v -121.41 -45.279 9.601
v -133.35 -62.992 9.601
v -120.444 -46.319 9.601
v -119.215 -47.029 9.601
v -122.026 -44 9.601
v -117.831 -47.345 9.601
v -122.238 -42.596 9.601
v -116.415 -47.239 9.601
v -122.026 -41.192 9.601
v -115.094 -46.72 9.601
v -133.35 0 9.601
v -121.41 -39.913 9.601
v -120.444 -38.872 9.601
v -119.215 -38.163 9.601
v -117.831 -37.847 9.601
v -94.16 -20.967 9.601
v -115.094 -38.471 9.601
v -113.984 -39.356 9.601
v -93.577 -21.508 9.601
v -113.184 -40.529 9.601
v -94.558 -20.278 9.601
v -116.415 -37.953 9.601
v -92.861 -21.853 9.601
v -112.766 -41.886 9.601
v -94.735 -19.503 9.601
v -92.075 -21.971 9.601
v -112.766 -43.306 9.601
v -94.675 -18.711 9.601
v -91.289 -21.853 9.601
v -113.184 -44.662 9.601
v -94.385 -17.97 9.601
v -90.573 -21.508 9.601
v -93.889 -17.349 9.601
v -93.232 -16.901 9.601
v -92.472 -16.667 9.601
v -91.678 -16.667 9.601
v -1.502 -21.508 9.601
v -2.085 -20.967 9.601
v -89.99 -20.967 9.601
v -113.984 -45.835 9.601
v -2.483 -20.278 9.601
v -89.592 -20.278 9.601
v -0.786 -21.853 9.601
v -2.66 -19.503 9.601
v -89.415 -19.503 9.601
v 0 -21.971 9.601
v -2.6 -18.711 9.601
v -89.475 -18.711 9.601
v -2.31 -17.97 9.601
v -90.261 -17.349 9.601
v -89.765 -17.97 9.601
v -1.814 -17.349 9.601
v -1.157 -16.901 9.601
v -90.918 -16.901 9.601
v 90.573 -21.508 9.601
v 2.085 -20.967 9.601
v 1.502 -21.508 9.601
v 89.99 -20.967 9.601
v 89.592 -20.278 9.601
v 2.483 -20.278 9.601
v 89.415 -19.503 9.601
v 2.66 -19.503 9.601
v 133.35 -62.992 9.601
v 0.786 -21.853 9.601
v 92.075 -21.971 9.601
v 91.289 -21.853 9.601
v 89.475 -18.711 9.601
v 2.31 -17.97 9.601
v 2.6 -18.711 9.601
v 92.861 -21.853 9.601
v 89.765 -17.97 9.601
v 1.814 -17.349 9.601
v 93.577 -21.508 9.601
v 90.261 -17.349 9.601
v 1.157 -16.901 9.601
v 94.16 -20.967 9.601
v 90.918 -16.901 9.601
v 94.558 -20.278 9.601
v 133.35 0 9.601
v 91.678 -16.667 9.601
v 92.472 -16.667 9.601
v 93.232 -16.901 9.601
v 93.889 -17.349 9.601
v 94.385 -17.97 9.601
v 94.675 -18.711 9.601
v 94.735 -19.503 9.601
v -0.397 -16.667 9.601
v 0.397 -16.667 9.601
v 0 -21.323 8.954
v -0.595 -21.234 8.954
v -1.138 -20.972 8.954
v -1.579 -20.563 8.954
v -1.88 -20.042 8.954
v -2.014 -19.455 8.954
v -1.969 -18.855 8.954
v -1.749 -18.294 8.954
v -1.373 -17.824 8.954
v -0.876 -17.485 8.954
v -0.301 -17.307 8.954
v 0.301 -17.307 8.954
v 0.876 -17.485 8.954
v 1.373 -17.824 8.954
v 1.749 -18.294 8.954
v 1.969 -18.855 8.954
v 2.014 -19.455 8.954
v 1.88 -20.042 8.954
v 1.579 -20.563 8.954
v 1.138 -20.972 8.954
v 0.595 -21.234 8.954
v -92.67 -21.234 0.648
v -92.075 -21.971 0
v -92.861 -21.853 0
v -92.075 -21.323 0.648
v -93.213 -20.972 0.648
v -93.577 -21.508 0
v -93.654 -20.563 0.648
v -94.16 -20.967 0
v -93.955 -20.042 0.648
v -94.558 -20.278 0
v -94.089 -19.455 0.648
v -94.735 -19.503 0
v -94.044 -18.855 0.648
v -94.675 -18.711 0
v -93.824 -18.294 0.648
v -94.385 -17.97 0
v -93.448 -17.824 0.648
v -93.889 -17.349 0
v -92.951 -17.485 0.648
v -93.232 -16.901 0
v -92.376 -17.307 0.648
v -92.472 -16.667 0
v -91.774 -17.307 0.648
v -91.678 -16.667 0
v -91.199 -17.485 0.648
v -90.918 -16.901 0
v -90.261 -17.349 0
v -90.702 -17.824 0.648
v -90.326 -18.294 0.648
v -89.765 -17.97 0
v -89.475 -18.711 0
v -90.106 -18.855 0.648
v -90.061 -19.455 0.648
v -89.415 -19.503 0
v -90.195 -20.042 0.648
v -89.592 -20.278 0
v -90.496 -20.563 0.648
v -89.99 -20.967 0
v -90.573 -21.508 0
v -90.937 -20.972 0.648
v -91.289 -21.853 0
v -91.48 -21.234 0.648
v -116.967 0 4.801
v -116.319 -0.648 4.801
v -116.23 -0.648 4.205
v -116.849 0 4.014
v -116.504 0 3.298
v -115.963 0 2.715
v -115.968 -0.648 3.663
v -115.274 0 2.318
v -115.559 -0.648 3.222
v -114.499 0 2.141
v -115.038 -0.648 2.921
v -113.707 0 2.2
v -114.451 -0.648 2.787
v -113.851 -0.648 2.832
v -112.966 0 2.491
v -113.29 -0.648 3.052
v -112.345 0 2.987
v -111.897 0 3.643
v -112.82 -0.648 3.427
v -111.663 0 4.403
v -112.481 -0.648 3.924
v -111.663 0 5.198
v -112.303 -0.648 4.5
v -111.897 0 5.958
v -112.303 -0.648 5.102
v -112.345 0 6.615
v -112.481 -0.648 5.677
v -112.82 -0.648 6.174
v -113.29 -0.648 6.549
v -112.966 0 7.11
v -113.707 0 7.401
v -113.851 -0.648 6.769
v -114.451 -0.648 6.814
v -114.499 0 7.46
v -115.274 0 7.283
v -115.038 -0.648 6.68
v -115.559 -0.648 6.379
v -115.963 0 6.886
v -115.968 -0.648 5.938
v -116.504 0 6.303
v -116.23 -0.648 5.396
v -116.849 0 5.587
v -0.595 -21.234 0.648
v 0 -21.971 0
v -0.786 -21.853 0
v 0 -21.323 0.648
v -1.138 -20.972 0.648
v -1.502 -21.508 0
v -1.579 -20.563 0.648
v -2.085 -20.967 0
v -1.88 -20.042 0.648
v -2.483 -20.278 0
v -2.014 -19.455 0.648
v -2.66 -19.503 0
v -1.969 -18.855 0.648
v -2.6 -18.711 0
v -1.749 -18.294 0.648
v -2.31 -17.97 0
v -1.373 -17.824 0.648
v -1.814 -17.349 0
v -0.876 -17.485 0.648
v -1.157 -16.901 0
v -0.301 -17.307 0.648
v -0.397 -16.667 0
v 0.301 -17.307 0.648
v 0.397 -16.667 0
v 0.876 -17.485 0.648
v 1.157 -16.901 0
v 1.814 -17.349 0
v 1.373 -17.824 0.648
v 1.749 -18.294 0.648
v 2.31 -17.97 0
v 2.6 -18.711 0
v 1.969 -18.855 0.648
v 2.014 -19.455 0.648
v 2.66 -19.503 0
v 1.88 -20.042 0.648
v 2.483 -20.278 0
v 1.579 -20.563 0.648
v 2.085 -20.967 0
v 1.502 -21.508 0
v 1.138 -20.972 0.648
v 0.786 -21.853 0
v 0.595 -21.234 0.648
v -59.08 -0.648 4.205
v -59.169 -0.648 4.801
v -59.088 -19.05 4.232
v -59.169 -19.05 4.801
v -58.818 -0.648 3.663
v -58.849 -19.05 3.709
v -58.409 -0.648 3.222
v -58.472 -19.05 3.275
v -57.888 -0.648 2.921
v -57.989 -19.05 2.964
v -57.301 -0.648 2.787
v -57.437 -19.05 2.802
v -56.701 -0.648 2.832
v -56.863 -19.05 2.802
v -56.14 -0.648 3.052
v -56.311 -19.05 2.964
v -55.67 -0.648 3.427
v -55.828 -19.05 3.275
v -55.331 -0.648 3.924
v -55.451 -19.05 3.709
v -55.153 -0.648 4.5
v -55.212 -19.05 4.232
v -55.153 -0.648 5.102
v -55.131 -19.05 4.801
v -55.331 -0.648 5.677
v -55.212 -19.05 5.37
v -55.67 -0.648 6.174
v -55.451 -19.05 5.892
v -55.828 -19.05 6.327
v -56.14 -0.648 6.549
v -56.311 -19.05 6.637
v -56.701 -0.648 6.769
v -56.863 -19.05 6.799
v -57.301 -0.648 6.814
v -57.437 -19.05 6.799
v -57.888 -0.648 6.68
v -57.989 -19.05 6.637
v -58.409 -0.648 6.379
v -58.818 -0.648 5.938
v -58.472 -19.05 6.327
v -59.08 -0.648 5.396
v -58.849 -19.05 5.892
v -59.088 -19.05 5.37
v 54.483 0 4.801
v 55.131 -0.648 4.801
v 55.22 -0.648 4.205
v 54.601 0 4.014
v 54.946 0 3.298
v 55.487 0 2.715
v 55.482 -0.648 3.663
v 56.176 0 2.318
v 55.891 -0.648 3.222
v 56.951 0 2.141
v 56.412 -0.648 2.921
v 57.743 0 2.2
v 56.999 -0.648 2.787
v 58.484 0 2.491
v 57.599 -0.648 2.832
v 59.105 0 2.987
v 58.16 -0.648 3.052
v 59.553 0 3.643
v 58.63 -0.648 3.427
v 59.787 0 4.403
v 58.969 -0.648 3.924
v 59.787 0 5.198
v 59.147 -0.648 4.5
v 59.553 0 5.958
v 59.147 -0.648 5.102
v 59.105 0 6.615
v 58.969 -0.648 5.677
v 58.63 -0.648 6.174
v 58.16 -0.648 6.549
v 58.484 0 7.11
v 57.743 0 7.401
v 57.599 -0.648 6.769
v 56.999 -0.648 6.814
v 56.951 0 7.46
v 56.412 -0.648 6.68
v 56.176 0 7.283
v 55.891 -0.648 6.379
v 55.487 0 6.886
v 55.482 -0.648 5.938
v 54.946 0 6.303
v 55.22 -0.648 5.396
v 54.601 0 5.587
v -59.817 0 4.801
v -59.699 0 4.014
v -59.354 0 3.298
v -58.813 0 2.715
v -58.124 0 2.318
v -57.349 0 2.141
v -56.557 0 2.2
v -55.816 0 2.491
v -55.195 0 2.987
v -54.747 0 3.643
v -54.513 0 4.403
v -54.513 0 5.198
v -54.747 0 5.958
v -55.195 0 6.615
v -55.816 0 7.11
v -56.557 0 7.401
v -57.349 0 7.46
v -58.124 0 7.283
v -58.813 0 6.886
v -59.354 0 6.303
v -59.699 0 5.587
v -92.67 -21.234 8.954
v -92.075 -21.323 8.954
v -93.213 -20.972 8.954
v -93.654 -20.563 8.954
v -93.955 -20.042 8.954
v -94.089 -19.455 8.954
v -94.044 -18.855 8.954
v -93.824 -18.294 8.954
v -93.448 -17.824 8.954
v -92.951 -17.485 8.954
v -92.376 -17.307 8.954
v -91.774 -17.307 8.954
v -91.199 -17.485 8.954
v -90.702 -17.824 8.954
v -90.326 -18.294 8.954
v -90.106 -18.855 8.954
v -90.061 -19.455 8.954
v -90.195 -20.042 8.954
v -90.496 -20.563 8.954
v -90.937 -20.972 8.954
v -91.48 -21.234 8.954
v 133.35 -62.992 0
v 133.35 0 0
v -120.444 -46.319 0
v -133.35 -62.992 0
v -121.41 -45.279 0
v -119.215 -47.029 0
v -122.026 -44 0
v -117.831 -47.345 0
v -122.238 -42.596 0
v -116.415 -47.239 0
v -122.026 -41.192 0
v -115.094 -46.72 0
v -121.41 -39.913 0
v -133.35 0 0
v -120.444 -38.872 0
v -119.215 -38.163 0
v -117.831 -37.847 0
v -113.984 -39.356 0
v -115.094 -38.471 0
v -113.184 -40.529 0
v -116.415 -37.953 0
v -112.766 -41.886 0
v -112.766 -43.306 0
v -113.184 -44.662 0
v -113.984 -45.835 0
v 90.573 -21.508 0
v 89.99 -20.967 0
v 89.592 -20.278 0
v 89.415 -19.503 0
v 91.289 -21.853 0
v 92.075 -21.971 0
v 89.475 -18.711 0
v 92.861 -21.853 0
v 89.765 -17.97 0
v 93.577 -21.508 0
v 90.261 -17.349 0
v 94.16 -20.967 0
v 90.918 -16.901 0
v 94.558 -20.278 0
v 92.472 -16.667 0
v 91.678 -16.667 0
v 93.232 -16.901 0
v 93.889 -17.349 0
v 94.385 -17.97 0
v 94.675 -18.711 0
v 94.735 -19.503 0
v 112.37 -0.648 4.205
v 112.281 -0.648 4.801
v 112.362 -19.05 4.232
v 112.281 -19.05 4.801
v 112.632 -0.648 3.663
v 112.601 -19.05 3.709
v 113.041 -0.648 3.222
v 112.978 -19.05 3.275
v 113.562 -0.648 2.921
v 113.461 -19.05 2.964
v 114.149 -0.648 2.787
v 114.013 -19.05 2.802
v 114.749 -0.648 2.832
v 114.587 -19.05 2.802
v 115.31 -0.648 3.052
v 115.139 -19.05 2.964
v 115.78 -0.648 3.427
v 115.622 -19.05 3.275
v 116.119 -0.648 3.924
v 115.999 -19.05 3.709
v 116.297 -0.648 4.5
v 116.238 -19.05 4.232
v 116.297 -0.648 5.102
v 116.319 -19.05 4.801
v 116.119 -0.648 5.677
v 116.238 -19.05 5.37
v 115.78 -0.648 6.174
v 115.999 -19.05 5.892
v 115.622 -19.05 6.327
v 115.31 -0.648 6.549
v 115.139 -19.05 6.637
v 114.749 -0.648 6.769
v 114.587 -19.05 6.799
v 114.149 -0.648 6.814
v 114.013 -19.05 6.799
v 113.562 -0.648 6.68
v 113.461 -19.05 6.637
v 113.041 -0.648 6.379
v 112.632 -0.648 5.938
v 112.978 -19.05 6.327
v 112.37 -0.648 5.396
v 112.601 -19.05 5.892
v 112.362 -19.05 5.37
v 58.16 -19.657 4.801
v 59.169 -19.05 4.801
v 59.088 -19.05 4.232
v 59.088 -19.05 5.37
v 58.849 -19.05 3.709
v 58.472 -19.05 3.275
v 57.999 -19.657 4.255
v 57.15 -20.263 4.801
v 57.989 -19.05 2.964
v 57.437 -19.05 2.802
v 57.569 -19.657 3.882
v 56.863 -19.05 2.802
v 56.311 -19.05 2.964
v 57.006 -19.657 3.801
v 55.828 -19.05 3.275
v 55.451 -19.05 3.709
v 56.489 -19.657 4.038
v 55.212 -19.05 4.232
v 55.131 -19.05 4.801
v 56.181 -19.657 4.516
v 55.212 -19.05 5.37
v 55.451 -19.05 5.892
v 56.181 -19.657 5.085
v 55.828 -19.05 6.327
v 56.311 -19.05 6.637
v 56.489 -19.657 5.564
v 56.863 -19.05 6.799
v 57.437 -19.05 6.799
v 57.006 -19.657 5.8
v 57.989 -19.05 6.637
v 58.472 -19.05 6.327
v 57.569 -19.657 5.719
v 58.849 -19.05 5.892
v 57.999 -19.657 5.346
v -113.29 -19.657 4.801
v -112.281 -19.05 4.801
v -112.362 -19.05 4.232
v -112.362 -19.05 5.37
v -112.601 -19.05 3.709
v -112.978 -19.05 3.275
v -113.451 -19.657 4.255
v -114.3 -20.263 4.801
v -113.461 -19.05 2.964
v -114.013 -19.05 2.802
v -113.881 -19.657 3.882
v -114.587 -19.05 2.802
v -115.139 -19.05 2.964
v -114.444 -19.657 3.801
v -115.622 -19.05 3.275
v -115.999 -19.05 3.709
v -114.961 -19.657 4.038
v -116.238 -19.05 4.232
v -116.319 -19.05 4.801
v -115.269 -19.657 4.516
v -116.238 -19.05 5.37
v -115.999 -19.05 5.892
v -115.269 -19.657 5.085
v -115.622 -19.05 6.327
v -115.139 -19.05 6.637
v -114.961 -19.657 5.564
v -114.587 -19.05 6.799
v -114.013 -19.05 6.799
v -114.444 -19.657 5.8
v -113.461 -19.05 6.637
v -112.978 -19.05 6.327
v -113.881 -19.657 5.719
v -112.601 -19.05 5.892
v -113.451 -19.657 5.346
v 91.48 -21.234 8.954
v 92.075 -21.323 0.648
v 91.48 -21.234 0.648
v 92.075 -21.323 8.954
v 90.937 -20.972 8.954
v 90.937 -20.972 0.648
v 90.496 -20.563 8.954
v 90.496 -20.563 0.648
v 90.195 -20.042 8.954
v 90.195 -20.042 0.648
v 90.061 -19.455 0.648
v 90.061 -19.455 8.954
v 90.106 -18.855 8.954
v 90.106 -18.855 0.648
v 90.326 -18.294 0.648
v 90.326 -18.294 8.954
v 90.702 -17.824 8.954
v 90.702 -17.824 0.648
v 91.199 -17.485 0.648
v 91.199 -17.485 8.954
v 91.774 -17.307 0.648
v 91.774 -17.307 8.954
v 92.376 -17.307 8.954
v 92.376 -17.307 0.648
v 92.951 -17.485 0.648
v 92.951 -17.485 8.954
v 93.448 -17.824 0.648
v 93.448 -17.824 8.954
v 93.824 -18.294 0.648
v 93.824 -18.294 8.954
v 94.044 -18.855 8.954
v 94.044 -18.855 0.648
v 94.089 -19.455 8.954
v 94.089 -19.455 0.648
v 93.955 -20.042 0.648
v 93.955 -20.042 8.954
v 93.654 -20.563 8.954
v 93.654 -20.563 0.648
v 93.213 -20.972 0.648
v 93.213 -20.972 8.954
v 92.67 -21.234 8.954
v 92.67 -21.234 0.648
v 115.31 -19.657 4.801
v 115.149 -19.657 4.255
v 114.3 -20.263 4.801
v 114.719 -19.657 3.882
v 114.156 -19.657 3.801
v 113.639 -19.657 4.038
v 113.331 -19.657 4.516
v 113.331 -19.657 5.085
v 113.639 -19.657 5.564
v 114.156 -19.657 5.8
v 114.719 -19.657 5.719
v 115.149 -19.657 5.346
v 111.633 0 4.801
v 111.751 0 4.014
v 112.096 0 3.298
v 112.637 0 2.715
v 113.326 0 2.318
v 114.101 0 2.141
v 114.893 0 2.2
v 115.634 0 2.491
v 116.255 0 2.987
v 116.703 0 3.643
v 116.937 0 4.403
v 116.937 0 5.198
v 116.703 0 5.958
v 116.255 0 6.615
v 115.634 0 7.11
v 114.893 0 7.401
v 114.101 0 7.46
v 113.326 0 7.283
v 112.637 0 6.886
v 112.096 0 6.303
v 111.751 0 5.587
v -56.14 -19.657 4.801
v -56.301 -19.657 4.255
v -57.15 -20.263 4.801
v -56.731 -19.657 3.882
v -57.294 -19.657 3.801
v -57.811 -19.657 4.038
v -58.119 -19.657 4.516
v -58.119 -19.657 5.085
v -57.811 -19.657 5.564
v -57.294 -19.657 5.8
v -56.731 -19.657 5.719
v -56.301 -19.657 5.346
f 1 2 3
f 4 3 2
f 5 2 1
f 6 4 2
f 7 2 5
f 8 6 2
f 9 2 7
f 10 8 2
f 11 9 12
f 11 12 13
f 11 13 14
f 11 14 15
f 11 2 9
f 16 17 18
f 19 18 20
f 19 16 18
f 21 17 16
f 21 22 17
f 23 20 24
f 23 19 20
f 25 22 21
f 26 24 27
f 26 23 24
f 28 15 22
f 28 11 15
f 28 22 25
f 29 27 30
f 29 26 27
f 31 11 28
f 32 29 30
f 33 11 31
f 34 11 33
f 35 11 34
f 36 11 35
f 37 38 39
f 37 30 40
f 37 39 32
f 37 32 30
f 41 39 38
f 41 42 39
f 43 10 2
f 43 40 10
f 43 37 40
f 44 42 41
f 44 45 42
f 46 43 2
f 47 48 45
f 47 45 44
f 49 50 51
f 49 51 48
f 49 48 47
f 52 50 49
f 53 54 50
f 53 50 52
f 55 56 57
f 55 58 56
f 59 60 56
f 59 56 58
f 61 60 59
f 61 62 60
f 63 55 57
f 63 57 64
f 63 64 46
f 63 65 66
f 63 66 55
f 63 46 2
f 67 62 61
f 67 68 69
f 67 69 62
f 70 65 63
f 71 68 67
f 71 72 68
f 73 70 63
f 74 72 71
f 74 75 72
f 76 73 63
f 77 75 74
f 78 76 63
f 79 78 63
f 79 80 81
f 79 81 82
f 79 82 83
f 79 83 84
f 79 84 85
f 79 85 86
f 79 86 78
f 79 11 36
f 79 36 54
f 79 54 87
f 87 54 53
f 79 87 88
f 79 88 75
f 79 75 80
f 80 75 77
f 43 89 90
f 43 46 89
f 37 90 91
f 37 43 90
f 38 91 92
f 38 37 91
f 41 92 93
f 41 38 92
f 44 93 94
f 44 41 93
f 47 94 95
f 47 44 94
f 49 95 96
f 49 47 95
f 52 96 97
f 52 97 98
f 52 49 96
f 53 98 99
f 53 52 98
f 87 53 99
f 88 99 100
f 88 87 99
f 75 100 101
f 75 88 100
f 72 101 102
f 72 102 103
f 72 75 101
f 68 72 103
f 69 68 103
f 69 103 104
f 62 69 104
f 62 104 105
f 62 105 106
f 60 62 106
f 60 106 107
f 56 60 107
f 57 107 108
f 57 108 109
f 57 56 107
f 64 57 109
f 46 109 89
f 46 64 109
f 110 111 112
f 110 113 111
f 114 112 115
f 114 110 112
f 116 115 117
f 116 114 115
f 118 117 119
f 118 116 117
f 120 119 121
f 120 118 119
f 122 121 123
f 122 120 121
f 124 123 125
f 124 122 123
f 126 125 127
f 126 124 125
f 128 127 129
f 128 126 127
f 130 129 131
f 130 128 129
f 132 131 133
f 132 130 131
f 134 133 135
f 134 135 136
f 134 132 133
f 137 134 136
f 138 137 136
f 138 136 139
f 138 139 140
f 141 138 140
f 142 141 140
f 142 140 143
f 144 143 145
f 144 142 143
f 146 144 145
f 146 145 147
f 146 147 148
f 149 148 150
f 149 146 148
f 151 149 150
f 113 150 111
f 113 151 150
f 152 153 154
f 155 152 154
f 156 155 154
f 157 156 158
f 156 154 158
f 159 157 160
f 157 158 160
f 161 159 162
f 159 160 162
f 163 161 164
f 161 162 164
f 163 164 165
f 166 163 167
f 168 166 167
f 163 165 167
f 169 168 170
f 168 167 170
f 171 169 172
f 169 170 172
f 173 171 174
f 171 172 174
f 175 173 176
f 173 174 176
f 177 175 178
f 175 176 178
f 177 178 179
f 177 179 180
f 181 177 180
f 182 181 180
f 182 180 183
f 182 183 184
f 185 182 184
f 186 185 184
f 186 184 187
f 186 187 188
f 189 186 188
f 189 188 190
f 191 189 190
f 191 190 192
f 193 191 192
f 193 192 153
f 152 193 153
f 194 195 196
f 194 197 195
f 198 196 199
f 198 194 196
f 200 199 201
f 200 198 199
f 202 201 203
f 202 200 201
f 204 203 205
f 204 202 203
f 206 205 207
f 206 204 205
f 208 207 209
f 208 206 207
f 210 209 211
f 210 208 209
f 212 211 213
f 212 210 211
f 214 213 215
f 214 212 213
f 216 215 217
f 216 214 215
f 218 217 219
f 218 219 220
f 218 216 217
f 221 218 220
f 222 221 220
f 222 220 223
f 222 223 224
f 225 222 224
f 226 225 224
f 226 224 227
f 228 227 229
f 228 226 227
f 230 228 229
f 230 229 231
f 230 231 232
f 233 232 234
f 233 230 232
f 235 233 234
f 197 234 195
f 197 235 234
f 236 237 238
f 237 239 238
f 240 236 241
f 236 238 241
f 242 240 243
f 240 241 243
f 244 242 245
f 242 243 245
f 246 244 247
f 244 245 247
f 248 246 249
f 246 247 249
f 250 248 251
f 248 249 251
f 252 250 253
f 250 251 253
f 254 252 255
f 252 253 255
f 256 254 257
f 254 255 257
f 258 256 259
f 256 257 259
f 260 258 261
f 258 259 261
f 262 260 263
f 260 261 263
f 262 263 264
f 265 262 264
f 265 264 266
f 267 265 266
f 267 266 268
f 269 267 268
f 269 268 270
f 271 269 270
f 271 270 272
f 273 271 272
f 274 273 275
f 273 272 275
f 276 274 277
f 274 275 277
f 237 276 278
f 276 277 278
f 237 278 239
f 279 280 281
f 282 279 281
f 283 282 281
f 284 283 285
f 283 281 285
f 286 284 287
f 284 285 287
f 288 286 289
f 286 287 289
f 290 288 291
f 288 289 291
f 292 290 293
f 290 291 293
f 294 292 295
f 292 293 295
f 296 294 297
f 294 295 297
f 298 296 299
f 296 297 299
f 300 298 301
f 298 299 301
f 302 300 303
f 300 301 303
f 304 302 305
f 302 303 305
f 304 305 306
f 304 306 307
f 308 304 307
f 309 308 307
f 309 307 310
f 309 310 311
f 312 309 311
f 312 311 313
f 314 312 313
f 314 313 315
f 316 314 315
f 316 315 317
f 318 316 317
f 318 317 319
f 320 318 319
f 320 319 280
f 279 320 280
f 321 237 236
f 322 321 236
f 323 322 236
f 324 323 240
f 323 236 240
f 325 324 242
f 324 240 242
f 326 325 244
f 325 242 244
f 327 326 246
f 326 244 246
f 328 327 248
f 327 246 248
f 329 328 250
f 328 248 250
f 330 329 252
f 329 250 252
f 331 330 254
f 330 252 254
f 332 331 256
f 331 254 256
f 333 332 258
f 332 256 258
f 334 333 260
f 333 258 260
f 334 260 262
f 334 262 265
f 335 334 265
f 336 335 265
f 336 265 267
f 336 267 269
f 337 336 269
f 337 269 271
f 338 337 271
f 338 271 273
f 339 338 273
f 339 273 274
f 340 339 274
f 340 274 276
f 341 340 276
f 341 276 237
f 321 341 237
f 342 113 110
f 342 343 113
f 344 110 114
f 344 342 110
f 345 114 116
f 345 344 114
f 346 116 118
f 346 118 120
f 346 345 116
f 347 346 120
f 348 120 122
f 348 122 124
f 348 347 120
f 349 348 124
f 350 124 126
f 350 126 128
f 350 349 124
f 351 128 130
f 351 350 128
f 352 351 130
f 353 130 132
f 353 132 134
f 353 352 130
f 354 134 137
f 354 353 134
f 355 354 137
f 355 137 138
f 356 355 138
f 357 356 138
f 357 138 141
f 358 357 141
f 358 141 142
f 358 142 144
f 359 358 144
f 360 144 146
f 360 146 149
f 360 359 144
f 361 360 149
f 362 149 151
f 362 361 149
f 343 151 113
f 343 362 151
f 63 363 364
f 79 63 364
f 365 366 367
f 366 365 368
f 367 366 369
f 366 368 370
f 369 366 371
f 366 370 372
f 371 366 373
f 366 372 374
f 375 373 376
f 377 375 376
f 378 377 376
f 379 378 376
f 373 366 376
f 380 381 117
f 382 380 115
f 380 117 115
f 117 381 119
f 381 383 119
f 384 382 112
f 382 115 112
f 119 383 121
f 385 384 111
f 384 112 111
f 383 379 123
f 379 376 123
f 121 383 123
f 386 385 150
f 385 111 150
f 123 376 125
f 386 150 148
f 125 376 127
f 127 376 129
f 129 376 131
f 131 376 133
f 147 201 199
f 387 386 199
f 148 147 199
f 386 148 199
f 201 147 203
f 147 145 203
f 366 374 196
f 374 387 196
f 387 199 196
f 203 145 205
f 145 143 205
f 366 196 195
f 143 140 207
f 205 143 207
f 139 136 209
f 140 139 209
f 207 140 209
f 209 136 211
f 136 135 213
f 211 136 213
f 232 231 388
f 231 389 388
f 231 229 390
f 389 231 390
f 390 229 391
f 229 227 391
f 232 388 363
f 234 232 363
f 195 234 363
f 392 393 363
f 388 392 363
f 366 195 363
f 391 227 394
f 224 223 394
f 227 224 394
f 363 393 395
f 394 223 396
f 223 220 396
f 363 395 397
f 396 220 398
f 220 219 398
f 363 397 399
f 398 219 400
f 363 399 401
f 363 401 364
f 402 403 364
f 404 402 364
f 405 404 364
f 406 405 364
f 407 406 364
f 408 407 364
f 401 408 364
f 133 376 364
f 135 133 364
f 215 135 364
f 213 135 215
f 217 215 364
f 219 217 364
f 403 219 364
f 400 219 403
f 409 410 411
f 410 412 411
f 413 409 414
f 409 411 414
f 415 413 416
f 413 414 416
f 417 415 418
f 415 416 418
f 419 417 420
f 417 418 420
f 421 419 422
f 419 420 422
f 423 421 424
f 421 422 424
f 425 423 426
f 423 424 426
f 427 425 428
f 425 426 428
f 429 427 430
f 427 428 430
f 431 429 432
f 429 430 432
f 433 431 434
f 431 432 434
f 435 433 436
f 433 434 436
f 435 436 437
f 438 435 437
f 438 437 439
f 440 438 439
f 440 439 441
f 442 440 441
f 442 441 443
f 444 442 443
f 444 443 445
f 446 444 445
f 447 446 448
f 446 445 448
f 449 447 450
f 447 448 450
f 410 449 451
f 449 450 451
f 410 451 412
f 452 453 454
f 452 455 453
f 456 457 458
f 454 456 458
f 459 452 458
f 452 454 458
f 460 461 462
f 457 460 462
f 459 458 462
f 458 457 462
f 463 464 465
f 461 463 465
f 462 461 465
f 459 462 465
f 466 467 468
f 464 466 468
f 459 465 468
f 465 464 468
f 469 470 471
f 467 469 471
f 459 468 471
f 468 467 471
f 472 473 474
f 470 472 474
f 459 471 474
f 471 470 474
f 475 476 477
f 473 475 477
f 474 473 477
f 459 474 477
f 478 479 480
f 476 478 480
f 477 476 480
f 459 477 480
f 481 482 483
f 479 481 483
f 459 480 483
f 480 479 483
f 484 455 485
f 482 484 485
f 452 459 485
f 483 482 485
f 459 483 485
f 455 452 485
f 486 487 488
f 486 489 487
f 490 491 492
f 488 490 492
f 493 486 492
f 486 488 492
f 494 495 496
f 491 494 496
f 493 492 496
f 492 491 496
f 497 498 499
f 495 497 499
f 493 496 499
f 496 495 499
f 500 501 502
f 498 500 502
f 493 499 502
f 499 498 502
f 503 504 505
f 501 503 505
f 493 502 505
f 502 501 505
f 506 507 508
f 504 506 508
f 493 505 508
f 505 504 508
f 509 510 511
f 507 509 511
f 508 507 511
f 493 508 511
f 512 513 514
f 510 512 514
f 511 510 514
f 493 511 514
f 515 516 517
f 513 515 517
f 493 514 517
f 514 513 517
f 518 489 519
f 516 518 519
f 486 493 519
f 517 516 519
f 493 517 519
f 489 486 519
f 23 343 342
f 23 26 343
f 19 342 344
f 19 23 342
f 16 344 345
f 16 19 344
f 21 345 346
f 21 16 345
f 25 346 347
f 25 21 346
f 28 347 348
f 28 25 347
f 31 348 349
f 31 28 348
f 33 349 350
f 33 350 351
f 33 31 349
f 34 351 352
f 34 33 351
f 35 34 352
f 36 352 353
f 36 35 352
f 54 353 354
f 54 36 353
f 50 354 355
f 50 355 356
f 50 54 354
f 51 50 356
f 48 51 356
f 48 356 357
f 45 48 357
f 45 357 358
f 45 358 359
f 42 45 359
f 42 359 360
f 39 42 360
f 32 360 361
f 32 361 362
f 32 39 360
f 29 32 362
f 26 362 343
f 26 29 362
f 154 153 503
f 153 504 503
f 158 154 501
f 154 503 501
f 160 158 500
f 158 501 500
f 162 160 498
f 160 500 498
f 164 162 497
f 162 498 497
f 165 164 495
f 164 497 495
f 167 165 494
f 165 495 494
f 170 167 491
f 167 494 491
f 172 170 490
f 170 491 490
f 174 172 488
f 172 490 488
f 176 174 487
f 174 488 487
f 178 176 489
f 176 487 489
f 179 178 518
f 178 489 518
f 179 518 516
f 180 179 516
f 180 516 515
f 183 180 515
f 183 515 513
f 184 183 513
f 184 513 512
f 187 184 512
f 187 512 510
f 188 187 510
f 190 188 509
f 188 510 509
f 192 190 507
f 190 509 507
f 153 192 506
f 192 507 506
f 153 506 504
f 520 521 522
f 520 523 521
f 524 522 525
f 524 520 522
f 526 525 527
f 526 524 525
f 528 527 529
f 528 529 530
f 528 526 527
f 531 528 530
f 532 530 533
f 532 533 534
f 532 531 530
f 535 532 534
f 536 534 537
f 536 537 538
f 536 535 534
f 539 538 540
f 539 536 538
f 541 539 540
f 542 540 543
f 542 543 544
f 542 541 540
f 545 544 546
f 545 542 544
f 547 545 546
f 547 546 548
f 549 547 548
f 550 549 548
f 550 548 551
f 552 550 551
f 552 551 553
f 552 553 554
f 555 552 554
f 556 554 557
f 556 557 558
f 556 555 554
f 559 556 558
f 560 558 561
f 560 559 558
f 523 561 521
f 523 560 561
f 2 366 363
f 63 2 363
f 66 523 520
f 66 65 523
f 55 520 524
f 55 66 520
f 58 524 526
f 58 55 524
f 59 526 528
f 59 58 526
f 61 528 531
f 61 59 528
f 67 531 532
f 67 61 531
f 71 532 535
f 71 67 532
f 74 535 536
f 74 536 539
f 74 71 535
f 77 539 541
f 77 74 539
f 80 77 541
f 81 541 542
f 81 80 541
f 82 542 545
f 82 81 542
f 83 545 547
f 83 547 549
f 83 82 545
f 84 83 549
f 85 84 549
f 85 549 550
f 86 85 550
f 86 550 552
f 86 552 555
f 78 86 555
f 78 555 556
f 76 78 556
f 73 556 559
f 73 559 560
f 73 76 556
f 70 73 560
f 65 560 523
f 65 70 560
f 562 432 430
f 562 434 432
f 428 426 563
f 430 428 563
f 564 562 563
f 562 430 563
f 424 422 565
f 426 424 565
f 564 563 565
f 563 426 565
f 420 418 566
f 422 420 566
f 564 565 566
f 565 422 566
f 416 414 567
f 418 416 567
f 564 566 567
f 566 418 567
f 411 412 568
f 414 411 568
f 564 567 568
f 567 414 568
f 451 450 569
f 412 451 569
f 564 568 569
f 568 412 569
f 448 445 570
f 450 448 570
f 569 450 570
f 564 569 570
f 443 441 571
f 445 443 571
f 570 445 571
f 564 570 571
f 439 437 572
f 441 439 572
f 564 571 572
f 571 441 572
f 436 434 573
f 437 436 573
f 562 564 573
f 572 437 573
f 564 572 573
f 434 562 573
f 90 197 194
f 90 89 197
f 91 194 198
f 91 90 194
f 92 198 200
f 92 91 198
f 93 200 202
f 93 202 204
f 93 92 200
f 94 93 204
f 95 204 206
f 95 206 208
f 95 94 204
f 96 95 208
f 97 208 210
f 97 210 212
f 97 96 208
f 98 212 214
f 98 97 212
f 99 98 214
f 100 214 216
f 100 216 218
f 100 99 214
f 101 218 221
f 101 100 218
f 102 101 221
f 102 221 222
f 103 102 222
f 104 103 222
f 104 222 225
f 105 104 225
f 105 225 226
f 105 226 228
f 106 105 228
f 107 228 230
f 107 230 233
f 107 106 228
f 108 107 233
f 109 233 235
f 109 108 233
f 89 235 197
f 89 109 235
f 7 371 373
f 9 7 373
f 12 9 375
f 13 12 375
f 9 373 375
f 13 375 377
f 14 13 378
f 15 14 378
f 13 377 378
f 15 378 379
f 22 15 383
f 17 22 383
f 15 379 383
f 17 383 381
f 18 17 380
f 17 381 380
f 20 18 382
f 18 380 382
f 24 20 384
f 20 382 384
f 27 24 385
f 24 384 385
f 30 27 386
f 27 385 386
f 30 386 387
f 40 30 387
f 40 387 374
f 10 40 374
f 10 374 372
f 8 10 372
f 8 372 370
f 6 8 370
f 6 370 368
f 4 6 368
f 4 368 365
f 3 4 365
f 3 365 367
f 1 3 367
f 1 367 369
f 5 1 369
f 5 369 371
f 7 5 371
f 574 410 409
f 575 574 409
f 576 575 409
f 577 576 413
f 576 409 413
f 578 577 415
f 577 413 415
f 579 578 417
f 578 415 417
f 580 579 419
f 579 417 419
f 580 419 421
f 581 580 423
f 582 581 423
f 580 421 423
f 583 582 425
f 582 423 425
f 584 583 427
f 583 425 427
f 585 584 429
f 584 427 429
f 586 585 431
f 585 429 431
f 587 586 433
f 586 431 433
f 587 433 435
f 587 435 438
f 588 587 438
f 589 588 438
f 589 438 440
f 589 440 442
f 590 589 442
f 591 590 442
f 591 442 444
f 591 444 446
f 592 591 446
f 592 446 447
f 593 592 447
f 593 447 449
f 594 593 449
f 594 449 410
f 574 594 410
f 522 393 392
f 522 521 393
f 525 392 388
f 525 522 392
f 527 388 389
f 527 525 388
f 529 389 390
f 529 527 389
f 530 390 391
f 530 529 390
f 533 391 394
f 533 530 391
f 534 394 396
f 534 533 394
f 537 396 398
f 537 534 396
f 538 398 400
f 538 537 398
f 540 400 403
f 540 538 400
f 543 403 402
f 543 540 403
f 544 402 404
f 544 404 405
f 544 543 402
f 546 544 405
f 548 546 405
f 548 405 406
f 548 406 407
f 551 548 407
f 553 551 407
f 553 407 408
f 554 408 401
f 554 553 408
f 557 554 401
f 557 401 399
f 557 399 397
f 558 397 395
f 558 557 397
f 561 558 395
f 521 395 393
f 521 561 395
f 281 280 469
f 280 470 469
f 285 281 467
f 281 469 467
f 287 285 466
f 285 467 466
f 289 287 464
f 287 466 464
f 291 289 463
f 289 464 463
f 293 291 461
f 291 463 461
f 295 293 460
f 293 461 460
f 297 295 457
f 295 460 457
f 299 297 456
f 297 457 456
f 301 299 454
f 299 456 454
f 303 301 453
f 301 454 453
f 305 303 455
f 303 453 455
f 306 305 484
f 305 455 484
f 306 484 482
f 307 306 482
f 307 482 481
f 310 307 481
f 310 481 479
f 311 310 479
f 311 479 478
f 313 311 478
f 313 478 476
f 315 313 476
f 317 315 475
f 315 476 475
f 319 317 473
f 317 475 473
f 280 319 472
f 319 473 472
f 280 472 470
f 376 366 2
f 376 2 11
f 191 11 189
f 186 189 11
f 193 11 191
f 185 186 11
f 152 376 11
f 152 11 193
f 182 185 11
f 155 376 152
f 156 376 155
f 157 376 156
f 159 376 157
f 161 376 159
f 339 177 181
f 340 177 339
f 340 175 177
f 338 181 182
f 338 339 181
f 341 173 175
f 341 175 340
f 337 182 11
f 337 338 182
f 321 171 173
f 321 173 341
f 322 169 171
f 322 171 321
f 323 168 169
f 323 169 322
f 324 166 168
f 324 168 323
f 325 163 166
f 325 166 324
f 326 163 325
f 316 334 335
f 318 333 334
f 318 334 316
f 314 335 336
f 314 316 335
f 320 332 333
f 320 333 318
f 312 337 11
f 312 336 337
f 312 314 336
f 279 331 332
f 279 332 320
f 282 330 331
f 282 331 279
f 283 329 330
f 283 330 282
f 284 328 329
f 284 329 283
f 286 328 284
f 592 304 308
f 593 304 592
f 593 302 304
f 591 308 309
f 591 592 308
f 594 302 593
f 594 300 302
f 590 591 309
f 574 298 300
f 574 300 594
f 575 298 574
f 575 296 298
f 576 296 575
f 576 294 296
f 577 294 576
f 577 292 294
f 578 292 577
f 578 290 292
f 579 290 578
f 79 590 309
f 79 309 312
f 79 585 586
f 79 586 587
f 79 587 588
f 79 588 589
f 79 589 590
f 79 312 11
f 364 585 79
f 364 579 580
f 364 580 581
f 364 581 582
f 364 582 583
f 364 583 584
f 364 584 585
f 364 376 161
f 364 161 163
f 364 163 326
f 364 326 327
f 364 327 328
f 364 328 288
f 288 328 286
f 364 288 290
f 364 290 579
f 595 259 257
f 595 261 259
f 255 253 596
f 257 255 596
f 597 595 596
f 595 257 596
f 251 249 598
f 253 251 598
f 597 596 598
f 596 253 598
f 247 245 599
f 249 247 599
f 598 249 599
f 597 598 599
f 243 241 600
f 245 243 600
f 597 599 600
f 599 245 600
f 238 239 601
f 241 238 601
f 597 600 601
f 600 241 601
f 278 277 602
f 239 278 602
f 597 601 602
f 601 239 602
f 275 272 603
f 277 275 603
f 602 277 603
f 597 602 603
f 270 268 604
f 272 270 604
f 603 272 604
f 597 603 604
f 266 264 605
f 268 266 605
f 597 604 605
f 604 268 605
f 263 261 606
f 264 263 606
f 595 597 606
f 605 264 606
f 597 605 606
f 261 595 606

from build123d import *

# Parameters (mm, degrees)
SKETCH1_W                        = 266.7
SKETCH1_H                        = 62.992
BOSS_EXTRUDE1_DEPTH              = 9.6012
F_10_32_TAPPED_HOLE1_AT_2_COUNT  = 2
F_10_32_TAPPED_HOLE1_AT_2_PITCH  = 92.075
F_10_32_TAPPED_HOLE1_AT_3_COUNT  = 2
F_10_32_TAPPED_HOLE1_AT_3_PITCH  = 184.15
F_3_8_0_3750_DOWEL_HOLE1_D       = 9.525
F_10_32_TAPPED_HOLE2_D           = 4.0386
F_10_32_TAPPED_HOLE2_DEPTH       = 19.05
F_10_32_TAPPED_HOLE2_CSINK_D     = 5.334
F_10_32_TAPPED_HOLE2_CSINK_ANGLE = 90
F_10_32_TAPPED_HOLE2_TIP         = 1.213317848


with BuildPart() as part:
    # Sketch1 → Boss-Extrude1 (new body)
    with BuildSketch(Plane.XY):
        with Locations((0, -31.496)):
            Rectangle(SKETCH1_W, SKETCH1_H)
    extrude(amount=BOSS_EXTRUDE1_DEPTH)

    # Sketch2 → #10-32 Tapped Hole1 (revolve, cut)
    with BuildSketch(Plane(origin=(92.075, -19.304, 9.6012), x_dir=(0, -1, 0), z_dir=(1, 0, 0))):
        Polygon((0, 0), (0, 9.6012), (2.667, 9.6012), (2.0193, 8.9535), (2.0193, 0.6477), (2.667, 0), align=None)
    f_10_32_tapped_hole1 = revolve(axis=Axis((92.075, -19.304, 15.9512), (0, 0, -1)), mode=Mode.SUBTRACT)

    # #10-32 Tapped Hole1 at 2: #10-32 Tapped Hole1 ×2
    with Locations(*[(-i * F_10_32_TAPPED_HOLE1_AT_2_PITCH, 0, 0) for i in range(1, F_10_32_TAPPED_HOLE1_AT_2_COUNT)]):
        add(f_10_32_tapped_hole1, mode=Mode.SUBTRACT)

    # #10-32 Tapped Hole1 at 3: #10-32 Tapped Hole1 ×2
    with Locations(*[(-i * F_10_32_TAPPED_HOLE1_AT_3_PITCH, 0, 0) for i in range(1, F_10_32_TAPPED_HOLE1_AT_3_COUNT)]):
        add(f_10_32_tapped_hole1, mode=Mode.SUBTRACT)

    # 3/8 (0.3750) Dowel Hole1 (through all)
    with Locations(Plane.XY.offset(9.6012)):
        with Locations((-117.475, -42.5958)):
            Hole(F_3_8_0_3750_DOWEL_HOLE1_D / 2)

    # #10-32 Tapped Hole2
    with Locations(Plane(origin=(0, 0, 0), x_dir=(1, 0, 0), z_dir=(0, 1, 0))):
        with Locations((114.3, -4.8006), (57.15, -4.8006), (-57.15, -4.8006), (-114.3, -4.8006)):
            CounterSinkHole(F_10_32_TAPPED_HOLE2_D / 2, F_10_32_TAPPED_HOLE2_CSINK_D / 2, depth=F_10_32_TAPPED_HOLE2_DEPTH, counter_sink_angle=F_10_32_TAPPED_HOLE2_CSINK_ANGLE)
            with Locations((0, 0, -(F_10_32_TAPPED_HOLE2_DEPTH + F_10_32_TAPPED_HOLE2_TIP / 2))):  # 118° drill point
                Cone(0, F_10_32_TAPPED_HOLE2_D / 2, F_10_32_TAPPED_HOLE2_TIP, mode=Mode.SUBTRACT)


solid = part.part
